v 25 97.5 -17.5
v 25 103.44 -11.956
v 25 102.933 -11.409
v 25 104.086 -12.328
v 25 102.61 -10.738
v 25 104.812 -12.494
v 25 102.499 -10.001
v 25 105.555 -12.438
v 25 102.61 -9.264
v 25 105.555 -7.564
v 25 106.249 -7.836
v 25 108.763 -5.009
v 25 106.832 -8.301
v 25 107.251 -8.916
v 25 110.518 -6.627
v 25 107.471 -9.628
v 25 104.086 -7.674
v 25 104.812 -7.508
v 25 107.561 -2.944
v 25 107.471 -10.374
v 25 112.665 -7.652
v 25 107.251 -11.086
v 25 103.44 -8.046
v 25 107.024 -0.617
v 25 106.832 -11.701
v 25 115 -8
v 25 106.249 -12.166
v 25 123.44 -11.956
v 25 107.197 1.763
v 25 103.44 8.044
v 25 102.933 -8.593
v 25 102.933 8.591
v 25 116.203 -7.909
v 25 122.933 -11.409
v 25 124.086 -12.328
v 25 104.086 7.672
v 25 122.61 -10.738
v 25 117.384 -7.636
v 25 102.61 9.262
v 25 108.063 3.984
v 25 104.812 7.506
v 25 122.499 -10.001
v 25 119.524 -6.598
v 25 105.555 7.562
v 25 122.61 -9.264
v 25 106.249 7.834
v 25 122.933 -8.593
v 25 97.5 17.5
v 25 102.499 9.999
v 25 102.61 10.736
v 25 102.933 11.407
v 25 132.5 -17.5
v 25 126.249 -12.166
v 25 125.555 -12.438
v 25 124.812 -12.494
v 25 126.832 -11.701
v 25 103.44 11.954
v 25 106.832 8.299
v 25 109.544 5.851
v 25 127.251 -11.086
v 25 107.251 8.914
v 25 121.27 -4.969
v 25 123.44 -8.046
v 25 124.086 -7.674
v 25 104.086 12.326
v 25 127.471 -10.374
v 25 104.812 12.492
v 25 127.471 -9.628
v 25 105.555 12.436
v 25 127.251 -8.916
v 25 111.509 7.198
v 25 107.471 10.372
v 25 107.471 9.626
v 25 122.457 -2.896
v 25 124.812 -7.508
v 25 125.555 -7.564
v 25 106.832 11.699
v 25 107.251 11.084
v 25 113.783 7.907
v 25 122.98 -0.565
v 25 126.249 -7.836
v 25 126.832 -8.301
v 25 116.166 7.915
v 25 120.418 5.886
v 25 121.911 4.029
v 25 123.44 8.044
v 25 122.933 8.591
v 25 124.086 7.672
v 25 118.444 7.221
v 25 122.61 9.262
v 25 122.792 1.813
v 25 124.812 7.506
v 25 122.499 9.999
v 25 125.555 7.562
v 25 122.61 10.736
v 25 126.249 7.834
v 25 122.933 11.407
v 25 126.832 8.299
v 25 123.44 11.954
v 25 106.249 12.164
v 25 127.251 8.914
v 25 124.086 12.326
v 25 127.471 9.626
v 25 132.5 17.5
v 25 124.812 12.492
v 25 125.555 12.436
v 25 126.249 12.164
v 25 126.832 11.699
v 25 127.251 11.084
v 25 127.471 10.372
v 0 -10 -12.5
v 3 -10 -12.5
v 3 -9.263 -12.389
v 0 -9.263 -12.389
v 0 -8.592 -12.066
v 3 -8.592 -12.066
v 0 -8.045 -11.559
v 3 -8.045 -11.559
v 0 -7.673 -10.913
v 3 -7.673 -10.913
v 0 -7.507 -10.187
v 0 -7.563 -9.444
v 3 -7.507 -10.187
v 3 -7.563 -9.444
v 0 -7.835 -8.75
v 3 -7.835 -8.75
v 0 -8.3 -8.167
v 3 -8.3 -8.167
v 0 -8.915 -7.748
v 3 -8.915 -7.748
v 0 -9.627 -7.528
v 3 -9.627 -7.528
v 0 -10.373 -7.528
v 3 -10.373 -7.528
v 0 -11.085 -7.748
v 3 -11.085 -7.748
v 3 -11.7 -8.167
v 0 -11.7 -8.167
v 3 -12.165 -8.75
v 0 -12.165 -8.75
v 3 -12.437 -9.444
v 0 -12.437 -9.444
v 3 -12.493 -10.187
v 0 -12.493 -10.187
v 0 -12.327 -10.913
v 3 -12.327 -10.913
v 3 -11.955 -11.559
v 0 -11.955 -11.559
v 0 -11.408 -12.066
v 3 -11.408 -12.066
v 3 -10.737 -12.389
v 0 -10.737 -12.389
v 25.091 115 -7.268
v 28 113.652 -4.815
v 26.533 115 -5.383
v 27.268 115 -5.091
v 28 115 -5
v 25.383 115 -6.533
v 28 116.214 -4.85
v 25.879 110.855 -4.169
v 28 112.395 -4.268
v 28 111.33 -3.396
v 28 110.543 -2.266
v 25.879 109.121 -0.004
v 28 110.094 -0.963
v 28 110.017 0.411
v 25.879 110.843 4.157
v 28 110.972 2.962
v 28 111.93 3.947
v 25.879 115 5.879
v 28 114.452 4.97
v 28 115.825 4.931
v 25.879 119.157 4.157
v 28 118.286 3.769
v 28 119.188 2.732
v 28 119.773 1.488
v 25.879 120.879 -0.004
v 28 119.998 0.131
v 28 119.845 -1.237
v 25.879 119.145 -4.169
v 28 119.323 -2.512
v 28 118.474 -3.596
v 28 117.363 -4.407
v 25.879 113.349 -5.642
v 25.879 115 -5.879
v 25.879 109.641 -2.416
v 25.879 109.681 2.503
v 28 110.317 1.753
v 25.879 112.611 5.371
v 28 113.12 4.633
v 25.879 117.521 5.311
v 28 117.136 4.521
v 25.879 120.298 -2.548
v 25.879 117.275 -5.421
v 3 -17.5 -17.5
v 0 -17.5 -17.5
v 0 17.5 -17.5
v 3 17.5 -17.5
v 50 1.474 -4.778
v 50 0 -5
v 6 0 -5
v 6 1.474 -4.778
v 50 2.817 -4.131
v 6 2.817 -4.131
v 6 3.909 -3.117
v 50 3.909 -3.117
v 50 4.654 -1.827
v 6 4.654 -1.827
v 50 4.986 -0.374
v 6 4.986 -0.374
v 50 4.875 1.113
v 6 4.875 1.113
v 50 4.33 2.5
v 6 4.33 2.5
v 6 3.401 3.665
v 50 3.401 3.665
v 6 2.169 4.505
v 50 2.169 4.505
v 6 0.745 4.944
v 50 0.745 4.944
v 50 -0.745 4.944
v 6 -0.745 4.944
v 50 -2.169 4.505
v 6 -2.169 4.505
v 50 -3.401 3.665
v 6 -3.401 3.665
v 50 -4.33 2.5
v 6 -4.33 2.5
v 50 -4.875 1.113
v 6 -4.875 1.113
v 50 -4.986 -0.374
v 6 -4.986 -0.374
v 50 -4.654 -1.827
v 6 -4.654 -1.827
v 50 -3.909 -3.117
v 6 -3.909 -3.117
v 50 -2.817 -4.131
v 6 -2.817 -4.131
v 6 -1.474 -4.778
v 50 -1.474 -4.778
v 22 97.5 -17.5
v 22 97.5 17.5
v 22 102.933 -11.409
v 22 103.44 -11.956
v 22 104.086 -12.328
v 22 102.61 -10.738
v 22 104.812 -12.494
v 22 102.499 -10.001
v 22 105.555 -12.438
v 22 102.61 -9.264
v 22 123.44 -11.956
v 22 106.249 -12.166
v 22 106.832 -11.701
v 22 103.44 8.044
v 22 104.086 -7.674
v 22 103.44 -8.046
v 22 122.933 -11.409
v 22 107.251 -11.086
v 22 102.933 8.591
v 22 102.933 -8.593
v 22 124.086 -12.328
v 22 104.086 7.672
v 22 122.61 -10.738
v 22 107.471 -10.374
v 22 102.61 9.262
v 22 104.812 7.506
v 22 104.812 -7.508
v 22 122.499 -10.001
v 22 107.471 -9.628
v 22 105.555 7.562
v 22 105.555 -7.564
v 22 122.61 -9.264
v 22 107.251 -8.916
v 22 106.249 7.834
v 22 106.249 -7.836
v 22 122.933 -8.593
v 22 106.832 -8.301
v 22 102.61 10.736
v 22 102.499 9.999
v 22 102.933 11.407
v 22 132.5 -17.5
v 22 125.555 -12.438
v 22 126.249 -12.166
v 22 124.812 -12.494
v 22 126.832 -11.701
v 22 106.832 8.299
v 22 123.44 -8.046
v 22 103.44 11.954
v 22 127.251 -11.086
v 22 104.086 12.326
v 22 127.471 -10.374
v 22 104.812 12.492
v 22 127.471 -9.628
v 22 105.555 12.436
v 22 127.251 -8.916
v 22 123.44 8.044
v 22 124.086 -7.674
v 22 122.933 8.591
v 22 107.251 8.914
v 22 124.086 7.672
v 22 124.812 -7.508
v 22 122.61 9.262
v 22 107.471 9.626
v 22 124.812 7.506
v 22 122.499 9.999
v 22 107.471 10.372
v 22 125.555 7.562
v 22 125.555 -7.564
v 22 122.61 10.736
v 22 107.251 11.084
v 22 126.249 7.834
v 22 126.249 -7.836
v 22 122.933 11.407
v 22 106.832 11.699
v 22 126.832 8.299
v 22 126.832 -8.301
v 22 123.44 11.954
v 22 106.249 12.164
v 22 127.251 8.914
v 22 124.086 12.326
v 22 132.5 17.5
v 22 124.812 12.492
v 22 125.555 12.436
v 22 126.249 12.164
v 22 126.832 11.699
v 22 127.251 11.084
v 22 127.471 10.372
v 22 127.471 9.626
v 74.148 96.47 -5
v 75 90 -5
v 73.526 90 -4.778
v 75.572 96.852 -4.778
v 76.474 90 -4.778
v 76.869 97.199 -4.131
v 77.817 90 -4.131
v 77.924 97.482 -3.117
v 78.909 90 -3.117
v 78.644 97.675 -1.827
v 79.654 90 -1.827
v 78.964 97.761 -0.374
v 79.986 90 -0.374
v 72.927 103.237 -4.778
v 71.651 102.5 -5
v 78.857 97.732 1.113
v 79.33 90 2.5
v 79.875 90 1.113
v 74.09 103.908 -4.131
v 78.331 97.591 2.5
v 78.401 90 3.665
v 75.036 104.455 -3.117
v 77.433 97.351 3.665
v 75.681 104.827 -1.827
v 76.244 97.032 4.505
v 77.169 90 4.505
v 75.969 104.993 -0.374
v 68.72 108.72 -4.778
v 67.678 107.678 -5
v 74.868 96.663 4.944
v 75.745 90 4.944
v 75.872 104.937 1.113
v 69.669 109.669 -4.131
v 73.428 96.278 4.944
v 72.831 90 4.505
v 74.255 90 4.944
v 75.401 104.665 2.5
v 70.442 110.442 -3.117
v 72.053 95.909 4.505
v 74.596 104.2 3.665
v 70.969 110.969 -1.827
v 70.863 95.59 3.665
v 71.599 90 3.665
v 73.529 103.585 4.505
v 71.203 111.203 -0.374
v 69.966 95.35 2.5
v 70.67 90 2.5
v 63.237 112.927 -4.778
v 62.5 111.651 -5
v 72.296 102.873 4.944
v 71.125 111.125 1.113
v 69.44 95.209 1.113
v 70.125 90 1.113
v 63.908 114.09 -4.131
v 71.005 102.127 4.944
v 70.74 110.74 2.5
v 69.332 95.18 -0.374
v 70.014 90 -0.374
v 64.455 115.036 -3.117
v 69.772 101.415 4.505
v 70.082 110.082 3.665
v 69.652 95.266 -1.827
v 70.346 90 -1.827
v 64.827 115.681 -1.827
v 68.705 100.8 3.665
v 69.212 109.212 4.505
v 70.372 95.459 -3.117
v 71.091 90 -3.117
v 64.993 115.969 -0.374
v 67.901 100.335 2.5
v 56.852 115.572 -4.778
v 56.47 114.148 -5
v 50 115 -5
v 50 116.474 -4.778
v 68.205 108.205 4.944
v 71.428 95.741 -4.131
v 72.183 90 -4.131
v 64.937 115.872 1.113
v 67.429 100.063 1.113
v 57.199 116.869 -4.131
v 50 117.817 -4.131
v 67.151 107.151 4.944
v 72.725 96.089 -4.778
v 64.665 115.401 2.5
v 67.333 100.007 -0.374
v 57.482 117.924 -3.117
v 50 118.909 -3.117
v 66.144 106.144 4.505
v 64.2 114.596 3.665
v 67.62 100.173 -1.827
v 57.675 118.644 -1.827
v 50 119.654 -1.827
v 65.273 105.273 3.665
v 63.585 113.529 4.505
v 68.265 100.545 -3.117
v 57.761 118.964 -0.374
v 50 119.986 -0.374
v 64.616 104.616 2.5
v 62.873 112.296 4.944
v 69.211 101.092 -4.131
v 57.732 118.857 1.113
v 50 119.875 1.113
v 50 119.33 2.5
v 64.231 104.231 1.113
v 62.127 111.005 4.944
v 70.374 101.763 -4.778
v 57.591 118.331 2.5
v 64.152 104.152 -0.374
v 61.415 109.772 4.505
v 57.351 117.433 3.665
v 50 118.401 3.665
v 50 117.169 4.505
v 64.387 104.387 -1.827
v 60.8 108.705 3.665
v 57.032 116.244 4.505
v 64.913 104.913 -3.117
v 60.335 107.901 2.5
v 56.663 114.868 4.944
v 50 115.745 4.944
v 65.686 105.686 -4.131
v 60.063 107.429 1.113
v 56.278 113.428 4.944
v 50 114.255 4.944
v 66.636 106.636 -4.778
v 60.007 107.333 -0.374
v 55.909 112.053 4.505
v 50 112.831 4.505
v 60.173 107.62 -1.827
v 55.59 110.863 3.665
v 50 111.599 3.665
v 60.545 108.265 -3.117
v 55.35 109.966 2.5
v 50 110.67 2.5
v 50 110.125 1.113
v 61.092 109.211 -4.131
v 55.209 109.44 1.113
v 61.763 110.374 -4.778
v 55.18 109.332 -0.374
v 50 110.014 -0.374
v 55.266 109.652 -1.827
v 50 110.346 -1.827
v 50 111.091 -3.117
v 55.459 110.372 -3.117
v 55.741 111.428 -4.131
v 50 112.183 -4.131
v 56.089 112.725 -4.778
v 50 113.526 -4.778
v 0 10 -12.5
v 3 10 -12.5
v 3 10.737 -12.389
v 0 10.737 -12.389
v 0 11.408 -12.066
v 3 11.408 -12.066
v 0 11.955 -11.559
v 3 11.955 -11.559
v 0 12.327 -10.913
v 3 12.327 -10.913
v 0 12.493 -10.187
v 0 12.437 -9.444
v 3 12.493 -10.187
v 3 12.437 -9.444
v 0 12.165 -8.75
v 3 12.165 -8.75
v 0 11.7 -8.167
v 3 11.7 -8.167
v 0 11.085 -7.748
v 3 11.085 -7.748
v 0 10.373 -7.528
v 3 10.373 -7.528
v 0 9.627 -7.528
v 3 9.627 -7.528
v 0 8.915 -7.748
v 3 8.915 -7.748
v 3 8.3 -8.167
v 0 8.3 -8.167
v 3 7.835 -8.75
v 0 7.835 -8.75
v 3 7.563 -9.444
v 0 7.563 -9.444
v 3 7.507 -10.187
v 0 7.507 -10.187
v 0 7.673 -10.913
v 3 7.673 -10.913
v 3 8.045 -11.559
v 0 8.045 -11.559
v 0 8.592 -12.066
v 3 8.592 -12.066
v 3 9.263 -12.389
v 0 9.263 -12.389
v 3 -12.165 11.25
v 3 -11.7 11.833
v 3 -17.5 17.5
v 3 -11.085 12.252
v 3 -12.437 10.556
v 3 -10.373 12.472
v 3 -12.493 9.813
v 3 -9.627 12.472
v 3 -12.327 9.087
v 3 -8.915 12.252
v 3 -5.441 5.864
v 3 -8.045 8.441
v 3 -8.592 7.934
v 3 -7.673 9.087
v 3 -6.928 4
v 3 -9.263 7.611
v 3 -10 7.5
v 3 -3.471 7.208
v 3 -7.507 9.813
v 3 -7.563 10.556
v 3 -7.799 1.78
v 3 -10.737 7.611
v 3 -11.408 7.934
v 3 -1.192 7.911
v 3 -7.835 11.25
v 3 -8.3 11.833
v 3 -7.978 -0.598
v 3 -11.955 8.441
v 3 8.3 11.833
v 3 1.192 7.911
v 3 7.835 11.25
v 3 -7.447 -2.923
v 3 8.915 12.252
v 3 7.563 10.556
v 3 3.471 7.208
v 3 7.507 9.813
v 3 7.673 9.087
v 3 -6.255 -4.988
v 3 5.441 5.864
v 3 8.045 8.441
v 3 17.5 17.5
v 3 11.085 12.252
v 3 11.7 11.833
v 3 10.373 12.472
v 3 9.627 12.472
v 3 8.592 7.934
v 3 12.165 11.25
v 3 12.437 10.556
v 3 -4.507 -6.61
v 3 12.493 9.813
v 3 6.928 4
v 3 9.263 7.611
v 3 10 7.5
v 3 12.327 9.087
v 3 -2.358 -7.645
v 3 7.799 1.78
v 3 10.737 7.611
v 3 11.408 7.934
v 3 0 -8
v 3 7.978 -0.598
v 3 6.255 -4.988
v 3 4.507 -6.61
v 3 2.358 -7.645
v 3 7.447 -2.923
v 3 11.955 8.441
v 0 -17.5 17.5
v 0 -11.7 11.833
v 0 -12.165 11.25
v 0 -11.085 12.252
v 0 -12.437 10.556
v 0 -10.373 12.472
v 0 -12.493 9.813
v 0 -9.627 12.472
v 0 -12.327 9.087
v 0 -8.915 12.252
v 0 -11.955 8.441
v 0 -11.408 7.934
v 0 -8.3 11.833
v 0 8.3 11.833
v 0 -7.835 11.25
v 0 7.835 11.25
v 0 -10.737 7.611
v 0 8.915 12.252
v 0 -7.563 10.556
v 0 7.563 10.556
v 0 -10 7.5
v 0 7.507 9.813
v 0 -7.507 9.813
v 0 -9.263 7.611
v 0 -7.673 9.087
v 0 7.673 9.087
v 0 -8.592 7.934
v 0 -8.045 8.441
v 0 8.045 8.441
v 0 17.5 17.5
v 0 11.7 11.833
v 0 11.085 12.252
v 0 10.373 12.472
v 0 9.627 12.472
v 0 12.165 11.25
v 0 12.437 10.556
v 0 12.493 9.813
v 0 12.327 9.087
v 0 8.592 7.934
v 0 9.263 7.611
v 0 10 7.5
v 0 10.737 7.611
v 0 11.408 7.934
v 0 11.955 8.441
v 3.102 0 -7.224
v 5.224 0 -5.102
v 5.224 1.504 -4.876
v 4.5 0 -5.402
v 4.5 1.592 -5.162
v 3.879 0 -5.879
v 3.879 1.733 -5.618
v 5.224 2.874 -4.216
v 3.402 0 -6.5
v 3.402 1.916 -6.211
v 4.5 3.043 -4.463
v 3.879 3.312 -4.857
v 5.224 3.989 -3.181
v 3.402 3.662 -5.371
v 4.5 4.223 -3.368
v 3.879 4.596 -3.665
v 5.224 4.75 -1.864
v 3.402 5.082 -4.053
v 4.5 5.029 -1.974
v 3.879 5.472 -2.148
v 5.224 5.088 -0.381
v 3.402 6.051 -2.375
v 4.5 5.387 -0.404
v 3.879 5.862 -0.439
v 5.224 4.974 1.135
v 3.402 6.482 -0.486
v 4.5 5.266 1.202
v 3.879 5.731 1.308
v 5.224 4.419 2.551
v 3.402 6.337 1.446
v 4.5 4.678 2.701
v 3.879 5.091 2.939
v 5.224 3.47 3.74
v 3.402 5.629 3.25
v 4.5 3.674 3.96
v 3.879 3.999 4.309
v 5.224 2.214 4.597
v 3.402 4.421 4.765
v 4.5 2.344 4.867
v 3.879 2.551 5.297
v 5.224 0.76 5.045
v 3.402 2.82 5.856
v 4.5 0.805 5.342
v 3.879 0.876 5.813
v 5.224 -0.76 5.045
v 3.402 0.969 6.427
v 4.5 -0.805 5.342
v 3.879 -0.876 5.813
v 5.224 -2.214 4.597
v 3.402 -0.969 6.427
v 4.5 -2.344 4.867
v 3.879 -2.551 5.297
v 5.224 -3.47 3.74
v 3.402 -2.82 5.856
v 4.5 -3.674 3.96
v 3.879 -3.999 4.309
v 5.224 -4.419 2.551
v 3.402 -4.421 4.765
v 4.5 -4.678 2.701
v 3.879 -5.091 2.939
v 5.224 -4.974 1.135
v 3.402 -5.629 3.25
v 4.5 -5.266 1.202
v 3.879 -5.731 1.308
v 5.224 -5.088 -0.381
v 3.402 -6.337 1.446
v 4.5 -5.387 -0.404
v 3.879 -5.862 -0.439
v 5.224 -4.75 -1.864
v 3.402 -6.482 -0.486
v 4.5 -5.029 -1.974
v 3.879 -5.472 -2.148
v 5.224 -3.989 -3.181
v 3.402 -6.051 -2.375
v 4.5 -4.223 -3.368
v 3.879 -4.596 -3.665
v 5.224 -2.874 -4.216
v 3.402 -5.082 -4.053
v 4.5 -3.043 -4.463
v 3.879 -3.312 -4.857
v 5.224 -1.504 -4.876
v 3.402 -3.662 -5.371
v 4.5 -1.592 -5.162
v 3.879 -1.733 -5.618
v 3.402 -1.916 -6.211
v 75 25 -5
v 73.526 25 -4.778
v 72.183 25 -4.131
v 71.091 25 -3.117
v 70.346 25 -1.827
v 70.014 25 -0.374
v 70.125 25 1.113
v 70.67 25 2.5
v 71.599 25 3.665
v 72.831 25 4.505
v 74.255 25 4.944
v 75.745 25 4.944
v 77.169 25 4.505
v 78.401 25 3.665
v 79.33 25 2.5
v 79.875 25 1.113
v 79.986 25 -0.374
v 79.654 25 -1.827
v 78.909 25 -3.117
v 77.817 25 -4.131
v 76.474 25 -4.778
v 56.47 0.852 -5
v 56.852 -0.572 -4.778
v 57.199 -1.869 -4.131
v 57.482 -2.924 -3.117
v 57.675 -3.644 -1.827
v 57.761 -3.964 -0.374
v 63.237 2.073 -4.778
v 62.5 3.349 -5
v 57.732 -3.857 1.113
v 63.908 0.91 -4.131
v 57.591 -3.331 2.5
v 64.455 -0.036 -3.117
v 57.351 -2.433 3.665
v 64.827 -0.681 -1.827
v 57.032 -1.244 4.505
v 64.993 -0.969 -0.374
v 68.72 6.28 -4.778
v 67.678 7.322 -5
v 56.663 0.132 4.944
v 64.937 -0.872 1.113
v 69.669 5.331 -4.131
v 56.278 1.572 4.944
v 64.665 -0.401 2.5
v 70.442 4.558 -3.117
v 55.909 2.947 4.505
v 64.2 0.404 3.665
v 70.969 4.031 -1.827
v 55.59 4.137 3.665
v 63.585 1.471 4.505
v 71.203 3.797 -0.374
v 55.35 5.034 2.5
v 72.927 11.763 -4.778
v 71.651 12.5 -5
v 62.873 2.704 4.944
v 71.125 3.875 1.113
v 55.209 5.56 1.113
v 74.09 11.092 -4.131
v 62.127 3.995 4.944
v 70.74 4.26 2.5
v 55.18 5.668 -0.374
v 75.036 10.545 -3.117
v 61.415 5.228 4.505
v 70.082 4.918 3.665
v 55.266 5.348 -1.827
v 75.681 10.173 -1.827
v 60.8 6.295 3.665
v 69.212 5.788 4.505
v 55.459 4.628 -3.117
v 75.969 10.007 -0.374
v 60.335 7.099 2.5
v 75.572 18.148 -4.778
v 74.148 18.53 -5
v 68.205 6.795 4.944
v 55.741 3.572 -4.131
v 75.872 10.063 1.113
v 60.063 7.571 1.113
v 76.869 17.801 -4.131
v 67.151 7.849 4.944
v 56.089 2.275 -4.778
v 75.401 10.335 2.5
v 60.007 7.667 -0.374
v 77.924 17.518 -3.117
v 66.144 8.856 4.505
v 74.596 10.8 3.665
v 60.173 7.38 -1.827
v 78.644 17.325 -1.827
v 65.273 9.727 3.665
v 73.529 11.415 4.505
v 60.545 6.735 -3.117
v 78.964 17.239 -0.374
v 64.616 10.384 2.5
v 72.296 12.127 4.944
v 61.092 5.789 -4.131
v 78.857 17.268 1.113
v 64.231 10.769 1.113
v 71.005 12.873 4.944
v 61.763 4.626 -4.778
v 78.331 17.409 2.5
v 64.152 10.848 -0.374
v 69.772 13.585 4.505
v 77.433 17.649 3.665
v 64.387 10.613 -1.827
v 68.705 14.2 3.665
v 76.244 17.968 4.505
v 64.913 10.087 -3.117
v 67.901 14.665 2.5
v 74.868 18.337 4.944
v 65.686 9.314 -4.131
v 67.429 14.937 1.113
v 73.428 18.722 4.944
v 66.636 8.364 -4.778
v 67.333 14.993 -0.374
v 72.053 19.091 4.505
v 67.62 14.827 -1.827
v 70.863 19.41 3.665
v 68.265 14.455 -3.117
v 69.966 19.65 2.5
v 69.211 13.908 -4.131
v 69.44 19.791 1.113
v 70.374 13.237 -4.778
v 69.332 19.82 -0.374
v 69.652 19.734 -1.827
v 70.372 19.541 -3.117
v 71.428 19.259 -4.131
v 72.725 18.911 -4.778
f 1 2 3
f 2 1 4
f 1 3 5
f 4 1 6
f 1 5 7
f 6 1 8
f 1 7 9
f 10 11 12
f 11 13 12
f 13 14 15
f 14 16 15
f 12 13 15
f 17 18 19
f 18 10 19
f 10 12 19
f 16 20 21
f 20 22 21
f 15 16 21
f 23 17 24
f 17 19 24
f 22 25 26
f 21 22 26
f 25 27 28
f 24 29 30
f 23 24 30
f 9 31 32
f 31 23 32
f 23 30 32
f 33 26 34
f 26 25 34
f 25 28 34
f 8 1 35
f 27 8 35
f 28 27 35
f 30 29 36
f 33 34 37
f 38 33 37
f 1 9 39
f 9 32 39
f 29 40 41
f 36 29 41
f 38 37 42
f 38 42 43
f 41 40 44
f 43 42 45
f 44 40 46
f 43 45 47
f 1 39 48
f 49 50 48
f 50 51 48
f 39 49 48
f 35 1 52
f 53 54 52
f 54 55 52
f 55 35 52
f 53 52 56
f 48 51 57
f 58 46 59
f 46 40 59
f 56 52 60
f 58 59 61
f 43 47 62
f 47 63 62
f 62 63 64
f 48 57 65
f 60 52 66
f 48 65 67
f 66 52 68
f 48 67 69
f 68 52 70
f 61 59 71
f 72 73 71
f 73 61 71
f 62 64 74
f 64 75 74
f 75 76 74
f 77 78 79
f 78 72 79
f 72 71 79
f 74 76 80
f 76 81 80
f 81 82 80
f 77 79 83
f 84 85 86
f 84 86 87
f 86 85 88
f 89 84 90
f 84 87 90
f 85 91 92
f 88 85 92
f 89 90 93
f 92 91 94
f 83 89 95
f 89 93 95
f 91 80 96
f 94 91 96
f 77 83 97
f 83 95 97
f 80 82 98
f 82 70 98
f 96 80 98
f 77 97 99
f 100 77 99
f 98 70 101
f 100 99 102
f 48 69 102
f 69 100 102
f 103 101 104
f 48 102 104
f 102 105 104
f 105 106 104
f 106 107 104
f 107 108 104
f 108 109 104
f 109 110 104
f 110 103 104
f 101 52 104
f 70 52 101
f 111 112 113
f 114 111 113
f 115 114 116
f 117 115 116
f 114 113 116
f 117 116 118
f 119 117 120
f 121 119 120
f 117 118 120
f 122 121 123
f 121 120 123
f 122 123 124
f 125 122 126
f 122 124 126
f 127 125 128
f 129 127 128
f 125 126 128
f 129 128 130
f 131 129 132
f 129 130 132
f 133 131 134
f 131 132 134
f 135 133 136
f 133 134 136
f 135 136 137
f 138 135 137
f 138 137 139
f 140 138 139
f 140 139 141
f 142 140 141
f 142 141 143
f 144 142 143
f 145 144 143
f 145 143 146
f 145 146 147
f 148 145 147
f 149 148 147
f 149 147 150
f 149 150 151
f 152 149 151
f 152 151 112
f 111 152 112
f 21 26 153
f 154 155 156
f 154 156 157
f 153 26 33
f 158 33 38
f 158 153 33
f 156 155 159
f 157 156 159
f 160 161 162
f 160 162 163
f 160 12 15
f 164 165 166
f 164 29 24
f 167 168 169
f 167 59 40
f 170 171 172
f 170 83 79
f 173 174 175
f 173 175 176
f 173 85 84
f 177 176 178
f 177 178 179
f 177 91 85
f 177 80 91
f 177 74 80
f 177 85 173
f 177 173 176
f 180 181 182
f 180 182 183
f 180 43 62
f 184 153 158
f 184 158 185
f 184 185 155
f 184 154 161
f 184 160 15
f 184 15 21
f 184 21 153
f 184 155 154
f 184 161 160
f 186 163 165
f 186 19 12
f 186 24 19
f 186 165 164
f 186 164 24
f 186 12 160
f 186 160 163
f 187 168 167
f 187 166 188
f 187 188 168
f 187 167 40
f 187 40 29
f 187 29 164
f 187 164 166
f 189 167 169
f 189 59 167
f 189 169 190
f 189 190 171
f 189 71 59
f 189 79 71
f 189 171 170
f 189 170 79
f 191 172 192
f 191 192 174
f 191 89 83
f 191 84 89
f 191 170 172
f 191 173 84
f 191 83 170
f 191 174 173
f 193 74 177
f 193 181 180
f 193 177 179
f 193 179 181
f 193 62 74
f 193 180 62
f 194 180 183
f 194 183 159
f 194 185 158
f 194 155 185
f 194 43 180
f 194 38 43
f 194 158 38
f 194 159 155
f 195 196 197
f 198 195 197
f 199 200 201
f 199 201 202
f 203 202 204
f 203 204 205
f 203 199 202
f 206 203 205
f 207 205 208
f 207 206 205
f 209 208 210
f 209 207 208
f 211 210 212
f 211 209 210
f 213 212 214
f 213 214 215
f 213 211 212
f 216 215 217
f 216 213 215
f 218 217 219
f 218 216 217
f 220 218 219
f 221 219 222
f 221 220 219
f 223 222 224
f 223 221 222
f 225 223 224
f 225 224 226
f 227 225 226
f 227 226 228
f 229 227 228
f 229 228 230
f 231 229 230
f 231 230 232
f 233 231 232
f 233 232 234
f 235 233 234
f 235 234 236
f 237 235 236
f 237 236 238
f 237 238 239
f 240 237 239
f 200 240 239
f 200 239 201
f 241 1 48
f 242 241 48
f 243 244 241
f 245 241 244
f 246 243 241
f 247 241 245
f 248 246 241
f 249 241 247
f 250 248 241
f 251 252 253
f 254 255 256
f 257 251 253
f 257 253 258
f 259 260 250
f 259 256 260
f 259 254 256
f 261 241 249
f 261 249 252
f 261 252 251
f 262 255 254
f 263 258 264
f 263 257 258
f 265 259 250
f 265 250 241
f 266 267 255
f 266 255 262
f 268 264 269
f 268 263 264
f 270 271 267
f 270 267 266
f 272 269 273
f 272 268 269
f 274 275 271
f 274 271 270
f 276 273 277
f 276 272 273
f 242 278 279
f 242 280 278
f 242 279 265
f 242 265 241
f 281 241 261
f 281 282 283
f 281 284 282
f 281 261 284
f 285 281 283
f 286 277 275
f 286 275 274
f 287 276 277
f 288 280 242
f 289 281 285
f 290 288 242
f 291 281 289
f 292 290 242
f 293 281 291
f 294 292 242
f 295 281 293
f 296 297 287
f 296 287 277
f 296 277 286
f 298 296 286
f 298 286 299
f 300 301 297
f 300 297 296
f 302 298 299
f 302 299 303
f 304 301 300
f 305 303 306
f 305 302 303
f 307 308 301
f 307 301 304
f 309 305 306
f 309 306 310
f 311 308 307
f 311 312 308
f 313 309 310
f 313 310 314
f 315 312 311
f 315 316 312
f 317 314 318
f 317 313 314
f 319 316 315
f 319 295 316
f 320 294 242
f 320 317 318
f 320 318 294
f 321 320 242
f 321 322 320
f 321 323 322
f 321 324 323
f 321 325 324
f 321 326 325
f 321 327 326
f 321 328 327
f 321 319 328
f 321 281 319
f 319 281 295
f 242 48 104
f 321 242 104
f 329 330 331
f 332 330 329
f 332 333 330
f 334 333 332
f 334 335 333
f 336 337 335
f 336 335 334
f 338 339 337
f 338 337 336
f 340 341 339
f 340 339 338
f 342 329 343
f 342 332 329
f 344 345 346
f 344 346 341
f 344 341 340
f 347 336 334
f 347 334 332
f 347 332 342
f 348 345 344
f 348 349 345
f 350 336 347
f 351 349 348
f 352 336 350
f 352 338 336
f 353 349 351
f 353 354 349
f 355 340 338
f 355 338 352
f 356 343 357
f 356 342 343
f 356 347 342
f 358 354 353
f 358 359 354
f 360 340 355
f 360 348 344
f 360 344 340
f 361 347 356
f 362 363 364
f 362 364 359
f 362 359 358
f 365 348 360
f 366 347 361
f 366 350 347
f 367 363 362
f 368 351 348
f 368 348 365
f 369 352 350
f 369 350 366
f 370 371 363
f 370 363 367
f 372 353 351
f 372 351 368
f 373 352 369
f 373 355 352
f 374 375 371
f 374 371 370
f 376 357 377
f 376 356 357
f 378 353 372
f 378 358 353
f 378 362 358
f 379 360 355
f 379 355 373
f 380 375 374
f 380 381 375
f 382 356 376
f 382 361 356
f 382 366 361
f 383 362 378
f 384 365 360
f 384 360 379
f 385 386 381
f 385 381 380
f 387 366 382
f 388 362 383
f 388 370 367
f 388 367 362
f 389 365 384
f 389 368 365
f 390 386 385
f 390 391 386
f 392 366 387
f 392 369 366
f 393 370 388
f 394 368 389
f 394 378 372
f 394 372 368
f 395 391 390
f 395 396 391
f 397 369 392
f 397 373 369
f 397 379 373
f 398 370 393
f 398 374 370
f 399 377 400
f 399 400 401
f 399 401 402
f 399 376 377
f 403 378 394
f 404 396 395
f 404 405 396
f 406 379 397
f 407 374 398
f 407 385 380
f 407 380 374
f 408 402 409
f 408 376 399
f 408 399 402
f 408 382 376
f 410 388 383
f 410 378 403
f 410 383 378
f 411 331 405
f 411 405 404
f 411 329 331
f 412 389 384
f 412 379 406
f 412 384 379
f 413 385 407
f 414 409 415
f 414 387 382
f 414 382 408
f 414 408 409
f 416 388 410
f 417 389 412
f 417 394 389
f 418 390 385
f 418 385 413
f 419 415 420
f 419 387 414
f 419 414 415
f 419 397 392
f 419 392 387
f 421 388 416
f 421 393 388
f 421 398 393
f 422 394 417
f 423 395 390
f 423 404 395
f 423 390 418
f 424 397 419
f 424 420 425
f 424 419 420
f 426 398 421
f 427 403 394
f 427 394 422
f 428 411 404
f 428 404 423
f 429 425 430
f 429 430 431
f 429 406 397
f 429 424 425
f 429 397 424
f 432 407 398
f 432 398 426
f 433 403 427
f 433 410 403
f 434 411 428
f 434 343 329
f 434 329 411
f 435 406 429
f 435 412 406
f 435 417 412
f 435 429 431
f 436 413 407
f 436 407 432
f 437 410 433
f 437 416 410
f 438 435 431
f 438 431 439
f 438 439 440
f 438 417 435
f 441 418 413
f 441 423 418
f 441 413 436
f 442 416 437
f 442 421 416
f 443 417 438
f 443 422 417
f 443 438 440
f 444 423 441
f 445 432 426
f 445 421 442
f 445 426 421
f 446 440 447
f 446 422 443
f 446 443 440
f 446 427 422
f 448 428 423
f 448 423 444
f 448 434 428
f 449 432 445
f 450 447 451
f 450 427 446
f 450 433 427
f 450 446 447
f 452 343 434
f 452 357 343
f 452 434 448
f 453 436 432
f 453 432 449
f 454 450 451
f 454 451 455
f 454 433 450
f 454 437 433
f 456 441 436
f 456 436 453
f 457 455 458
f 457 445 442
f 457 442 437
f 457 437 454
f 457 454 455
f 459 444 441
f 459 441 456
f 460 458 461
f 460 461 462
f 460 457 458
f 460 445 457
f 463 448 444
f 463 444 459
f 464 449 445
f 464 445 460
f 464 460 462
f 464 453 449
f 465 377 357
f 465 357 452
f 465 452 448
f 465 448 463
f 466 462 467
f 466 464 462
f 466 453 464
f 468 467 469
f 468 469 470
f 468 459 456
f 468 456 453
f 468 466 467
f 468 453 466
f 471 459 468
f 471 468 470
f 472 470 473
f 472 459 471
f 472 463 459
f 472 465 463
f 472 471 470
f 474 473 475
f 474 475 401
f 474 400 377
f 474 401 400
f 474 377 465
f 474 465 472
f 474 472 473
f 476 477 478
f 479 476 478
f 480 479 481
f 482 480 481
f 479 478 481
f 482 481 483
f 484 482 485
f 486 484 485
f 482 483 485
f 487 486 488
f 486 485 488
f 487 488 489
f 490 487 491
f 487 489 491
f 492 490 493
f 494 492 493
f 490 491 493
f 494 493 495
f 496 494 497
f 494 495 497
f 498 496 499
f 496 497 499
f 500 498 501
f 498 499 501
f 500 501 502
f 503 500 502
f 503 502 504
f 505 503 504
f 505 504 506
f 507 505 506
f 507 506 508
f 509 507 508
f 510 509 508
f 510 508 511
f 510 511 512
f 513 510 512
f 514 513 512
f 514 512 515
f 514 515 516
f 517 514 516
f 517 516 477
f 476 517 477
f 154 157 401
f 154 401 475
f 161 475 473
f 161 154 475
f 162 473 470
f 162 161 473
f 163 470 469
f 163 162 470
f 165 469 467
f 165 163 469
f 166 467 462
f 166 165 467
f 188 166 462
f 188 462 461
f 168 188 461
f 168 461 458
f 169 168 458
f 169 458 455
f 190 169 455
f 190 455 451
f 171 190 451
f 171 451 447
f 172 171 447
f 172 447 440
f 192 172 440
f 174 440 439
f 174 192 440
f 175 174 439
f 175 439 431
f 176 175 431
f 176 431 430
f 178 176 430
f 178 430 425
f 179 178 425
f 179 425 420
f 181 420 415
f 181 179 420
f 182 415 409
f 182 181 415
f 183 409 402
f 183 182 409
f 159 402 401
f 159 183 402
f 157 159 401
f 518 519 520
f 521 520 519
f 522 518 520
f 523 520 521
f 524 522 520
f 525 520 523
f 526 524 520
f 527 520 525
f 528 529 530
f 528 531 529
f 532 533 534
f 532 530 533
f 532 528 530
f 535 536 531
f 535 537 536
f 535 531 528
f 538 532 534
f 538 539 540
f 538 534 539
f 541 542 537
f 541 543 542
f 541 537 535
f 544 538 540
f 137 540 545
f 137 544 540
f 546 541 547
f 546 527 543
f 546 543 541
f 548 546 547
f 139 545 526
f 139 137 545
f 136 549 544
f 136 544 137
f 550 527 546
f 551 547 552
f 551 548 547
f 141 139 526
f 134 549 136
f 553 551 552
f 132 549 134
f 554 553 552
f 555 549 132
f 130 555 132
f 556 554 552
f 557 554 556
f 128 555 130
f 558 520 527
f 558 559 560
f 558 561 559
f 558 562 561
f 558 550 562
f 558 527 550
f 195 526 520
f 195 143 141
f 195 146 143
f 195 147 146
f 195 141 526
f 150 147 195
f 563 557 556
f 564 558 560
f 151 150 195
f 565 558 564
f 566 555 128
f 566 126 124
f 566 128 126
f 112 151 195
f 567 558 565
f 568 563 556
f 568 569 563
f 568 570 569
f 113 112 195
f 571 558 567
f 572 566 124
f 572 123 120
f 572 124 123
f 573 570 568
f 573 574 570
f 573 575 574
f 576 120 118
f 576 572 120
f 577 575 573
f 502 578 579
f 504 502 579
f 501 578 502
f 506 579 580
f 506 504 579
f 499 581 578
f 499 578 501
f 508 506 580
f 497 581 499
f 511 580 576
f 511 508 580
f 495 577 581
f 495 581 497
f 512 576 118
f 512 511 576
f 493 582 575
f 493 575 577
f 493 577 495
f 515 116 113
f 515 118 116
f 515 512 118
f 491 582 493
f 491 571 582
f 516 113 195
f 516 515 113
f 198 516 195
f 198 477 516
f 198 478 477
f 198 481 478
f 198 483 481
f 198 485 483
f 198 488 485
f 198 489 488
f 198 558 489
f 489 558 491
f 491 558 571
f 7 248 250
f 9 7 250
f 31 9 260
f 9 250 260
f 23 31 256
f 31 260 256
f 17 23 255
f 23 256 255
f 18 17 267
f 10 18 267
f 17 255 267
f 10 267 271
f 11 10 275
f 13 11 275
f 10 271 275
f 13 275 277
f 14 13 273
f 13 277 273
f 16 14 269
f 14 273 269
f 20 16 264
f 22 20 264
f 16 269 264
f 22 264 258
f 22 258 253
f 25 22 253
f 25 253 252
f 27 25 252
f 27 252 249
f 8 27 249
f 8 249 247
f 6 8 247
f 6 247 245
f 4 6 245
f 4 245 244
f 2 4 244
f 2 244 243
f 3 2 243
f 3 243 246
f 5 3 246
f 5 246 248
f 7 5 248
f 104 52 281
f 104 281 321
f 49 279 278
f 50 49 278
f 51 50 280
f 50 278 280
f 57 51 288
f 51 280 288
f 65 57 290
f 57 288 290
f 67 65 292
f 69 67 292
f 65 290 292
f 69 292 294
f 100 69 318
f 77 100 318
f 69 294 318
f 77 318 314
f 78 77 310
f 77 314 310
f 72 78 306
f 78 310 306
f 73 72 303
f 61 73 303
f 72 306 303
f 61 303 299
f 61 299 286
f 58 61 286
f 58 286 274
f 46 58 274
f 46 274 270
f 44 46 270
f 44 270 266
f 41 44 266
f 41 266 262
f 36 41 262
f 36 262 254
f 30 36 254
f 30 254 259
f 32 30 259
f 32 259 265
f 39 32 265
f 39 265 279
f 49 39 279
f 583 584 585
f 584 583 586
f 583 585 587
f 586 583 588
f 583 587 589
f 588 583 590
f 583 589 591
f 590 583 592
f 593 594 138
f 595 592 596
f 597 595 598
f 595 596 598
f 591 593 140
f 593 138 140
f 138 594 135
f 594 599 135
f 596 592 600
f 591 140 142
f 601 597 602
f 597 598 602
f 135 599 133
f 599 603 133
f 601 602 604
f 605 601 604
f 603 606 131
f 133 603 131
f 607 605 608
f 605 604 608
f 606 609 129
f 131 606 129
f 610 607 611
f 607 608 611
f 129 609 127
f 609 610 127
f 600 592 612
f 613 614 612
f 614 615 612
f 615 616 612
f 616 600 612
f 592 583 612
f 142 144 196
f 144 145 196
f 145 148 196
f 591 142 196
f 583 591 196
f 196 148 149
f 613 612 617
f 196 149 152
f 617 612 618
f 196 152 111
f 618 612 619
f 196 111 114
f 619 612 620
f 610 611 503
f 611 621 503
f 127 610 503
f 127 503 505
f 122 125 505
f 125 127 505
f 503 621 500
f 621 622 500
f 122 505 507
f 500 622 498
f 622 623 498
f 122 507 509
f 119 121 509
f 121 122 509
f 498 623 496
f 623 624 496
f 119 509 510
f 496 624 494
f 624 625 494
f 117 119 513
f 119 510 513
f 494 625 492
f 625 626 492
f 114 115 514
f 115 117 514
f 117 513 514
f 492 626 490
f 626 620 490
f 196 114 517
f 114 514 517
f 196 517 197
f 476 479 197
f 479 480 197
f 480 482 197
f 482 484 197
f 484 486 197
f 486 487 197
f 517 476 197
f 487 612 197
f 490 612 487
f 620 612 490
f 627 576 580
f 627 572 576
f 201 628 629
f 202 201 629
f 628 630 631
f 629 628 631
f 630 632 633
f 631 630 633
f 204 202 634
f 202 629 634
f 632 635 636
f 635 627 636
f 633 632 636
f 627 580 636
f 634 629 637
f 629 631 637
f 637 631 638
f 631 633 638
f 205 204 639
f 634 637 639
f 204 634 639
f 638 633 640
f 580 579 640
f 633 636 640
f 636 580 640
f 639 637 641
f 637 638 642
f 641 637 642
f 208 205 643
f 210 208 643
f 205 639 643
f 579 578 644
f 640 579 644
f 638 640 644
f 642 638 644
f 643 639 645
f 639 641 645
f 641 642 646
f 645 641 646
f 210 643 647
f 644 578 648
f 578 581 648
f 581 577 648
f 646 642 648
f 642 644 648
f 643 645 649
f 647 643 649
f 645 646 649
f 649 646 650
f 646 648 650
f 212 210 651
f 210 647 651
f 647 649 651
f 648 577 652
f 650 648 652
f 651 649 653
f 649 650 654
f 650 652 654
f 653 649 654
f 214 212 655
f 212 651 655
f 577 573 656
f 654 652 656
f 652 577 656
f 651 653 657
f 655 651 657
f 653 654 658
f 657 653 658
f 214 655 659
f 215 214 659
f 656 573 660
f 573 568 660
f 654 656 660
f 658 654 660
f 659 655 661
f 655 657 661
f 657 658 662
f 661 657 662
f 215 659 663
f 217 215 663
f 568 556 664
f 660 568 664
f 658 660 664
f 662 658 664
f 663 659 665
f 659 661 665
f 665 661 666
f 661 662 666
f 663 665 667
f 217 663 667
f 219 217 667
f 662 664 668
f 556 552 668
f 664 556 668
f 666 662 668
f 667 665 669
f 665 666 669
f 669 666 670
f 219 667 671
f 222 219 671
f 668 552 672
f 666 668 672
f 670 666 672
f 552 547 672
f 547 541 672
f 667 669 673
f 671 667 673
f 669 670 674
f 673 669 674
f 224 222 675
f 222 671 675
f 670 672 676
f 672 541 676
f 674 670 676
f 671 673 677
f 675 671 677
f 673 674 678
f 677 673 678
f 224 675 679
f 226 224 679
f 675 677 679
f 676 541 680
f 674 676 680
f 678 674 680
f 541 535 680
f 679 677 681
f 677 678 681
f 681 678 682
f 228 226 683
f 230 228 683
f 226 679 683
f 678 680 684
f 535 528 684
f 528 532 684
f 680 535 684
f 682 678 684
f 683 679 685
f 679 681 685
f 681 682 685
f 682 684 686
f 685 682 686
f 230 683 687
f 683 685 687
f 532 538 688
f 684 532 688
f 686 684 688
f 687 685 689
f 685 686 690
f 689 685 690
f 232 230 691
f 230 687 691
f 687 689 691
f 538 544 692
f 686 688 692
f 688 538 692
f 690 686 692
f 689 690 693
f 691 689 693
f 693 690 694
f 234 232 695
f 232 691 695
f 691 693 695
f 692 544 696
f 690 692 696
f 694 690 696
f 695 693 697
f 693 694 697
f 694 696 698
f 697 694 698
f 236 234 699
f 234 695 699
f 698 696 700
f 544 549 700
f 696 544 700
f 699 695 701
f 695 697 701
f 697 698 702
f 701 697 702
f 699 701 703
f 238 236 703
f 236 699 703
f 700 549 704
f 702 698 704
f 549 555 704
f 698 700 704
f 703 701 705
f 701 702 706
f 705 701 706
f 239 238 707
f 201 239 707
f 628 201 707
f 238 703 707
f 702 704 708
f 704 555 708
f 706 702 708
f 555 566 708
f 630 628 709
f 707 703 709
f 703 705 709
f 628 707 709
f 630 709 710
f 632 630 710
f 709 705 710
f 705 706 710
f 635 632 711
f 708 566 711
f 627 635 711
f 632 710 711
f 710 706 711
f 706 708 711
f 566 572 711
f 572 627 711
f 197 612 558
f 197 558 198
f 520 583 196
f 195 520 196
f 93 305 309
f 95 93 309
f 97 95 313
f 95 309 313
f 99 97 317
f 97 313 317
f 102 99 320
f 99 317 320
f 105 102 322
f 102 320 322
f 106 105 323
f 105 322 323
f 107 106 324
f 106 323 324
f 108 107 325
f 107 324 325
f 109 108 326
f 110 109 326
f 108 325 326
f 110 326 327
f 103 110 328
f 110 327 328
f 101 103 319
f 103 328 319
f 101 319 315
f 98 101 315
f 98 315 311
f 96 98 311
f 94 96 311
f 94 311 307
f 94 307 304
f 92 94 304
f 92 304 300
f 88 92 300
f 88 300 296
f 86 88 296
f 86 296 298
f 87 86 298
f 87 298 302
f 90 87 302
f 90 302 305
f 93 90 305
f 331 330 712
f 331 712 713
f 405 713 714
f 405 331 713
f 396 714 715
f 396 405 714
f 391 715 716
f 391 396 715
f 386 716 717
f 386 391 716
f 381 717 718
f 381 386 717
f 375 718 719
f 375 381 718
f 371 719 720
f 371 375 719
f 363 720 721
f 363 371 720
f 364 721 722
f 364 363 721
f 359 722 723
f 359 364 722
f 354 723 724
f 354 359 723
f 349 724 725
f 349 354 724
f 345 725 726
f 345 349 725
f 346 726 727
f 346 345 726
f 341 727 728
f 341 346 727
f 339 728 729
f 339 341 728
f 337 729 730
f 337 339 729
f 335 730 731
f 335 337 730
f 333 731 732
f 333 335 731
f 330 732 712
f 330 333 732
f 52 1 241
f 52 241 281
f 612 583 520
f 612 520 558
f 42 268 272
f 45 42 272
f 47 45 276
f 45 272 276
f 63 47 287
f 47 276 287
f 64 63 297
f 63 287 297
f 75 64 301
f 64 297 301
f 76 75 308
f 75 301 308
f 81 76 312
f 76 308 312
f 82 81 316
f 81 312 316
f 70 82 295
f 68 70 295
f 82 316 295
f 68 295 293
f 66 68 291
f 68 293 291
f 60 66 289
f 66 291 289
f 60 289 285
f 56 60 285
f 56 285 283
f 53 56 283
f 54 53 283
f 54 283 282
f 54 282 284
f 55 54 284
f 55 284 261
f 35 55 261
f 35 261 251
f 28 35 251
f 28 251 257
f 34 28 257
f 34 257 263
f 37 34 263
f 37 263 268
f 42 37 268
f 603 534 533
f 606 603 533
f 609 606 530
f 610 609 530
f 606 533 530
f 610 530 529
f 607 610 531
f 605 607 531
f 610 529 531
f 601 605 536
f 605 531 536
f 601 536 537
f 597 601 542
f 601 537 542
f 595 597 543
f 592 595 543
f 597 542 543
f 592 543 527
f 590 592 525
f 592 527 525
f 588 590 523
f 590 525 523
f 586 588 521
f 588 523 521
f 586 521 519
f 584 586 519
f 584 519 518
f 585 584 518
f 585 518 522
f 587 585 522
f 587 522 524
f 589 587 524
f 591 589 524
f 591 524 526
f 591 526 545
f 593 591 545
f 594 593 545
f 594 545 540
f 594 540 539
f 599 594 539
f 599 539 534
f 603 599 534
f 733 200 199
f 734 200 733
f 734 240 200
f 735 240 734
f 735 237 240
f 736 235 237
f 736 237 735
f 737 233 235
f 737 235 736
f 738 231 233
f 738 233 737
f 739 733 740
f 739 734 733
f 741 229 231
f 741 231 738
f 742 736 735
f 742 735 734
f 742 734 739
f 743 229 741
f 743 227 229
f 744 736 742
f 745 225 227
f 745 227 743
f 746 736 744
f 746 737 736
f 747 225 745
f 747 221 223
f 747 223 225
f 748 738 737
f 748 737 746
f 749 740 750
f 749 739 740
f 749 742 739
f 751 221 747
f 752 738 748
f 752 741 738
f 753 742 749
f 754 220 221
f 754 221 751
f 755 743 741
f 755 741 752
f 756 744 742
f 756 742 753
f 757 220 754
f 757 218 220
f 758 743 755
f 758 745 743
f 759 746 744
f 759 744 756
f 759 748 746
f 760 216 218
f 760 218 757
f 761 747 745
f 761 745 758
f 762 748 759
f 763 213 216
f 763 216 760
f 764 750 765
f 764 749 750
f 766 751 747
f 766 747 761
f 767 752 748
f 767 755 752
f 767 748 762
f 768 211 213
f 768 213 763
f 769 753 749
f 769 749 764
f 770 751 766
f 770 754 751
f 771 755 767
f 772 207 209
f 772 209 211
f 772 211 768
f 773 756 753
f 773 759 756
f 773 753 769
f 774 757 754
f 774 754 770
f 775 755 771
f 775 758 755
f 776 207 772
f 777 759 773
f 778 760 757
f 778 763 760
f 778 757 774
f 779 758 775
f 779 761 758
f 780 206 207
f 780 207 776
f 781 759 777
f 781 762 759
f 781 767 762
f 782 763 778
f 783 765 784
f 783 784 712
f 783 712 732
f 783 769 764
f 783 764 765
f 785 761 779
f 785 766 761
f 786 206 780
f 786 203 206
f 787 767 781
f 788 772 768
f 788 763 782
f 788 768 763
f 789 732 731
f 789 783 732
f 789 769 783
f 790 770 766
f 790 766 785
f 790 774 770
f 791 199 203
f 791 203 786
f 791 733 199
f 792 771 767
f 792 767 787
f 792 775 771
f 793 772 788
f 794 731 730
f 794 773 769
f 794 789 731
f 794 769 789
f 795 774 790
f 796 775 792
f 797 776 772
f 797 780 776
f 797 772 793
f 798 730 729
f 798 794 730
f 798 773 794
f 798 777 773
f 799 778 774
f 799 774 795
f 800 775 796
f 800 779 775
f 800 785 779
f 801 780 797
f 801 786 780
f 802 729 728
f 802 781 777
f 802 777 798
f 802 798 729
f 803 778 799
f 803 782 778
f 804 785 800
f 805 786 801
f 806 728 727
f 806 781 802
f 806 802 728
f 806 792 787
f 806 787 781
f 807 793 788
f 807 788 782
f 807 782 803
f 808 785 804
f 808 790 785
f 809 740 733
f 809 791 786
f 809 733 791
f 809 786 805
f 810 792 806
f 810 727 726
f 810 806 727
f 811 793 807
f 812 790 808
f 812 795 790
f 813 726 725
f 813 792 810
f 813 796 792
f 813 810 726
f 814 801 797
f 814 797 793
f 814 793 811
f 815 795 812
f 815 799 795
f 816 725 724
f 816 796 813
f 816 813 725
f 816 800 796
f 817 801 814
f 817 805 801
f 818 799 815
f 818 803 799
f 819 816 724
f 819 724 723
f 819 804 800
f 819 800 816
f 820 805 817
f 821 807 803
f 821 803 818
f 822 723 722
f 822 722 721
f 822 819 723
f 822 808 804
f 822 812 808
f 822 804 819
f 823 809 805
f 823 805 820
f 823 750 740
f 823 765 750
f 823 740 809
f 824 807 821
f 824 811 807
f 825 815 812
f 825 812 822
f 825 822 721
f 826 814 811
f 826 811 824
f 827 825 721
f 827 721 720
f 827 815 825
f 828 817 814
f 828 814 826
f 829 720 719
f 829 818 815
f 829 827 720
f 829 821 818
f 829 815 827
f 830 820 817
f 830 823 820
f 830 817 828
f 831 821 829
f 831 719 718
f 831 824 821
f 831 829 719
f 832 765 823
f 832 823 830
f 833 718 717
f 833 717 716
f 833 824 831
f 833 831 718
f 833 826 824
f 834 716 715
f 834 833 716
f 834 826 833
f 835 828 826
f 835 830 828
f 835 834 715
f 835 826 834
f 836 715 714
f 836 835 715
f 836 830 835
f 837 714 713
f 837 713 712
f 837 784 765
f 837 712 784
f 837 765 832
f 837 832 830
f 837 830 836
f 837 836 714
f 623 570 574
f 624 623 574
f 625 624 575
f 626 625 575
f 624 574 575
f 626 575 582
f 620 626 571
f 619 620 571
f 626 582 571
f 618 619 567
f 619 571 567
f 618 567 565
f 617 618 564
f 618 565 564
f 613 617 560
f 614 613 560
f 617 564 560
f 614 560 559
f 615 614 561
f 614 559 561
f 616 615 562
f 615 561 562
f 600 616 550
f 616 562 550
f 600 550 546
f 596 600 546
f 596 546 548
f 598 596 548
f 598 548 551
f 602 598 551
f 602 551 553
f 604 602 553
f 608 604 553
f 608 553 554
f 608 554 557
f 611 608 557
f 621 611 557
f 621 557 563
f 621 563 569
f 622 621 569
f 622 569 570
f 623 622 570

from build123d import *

# Parameters (mm, degrees)
SKETCH1_W            = 35
SKETCH1_H            = 35
BOSS_EXTRUDE1_DEPTH  = 3
SKETCH2_R            = 2.5
CUT_EXTRUDE1_DEPTH   = 25.929901725
LPATTERN1_COUNT      = 2
LPATTERN1_PITCH      = 20
LPATTERN1_COUNT_DIR2 = 2
LPATTERN1_PITCH_DIR2 = 20
SKETCH9_R            = 5
SKETCH10_W           = 35
SKETCH10_H           = 35
BOSS_EXTRUDE2_DEPTH  = 3
SKETCH11_R           = 2.5
CUT_EXTRUDE2_DEPTH   = 146.693169663
LPATTERN4_COUNT      = 2
LPATTERN4_PITCH      = 20
LPATTERN4_COUNT_DIR2 = 2
LPATTERN4_PITCH_DIR2 = 20
FILLET1_R            = 3
FILLET2_R            = 3


with BuildPart() as part:
    # Sketch1 → Boss-Extrude1 (new body)
    with BuildSketch(Plane(origin=(0, 0, 0), x_dir=(0, 0, -1), z_dir=(1, 0, 0))):
        Rectangle(SKETCH1_W, SKETCH1_H)
    extrude(amount=BOSS_EXTRUDE1_DEPTH)

    # Sketch2 → Cut-Extrude1 (cut, through all)
    with BuildSketch(Plane(origin=(3, 0, 0), x_dir=(0, 0, -1), z_dir=(1, 0, 0))):
        with Locations((10, 10)):
            Circle(SKETCH2_R)
    cut_extrude1 = extrude(amount=-CUT_EXTRUDE1_DEPTH, mode=Mode.SUBTRACT)

    # LPattern1: Cut-Extrude1 2 × 2
    with Locations(*[(0, -j * LPATTERN1_PITCH_DIR2, i * LPATTERN1_PITCH) for i in range(LPATTERN1_COUNT) for j in range(LPATTERN1_COUNT_DIR2) if (i, j) != (0, 0)]):
        add(cut_extrude1, mode=Mode.SUBTRACT)

    # Sweep1: sweep along a path in Sketch8
    with BuildLine(Plane.XY) as sweep1_path:
        Line((3, 0), (50, 0))
        ThreePointArc((50, 0), (67.677670206, 7.32233044), (75.000001, 25.0000005))
        Line((75.000001, 25.0000005), (75.000001, 90))
        ThreePointArc((75.000001, 90), (67.677670383, 107.677669883), (50.0000005, 115.0000005))
        Line((50.0000005, 115.0000005), (25.0000005, 115.0000005))
    # Sketch9 → Sweep1 (sweep)
    with BuildSketch(Plane(origin=(3, 0, 0), x_dir=(0, 0, -1), z_dir=(1, 0, 0))):
        Circle(SKETCH9_R)
    sweep(path=sweep1_path.line)

    # Sketch10 → Boss-Extrude2 (add)
    with BuildSketch(Plane(origin=(25.000002799, 5e-07, 0), x_dir=(0, 0, 1), z_dir=(-0.9999999999999998, -1.9990267318907433e-08, 0))):
        with Locations((0, 114.9999995)):
            Rectangle(SKETCH10_W, SKETCH10_H)
    extrude(amount=BOSS_EXTRUDE2_DEPTH)

    # Sketch11 → Cut-Extrude2 (cut, through all)
    with BuildSketch(Plane(origin=(22.000002799, 4.4e-07, 0), x_dir=(0, 0, 1), z_dir=(-0.9999999999999998, -1.999026737793079e-08, 0))):
        with Locations(Location((9.998977528, 124.998977028, 0), (0, 0, 270))):
            Circle(SKETCH11_R)
    cut_extrude2 = extrude(amount=-CUT_EXTRUDE2_DEPTH, mode=Mode.SUBTRACT)

    # LPattern4: Cut-Extrude2 2 × 2
    with Locations(*[(0, -j * LPATTERN4_PITCH_DIR2, -i * LPATTERN4_PITCH) for i in range(LPATTERN4_COUNT) for j in range(LPATTERN4_COUNT_DIR2) if (i, j) != (0, 0)]):
        add(cut_extrude2, mode=Mode.SUBTRACT)

    # Fillet1
    fillet1_edges = [part.edges().sort_by_distance(p)[0] for p in [
        (25.0000005, 115.0000005, 5),
    ]]
    fillet(fillet1_edges, radius=FILLET1_R)

    # Fillet2
    fillet2_edges = [part.edges().sort_by_distance(p)[0] for p in [
        (3, 0, 5),
    ]]
    fillet(fillet2_edges, radius=FILLET2_R)


solid = part.part
